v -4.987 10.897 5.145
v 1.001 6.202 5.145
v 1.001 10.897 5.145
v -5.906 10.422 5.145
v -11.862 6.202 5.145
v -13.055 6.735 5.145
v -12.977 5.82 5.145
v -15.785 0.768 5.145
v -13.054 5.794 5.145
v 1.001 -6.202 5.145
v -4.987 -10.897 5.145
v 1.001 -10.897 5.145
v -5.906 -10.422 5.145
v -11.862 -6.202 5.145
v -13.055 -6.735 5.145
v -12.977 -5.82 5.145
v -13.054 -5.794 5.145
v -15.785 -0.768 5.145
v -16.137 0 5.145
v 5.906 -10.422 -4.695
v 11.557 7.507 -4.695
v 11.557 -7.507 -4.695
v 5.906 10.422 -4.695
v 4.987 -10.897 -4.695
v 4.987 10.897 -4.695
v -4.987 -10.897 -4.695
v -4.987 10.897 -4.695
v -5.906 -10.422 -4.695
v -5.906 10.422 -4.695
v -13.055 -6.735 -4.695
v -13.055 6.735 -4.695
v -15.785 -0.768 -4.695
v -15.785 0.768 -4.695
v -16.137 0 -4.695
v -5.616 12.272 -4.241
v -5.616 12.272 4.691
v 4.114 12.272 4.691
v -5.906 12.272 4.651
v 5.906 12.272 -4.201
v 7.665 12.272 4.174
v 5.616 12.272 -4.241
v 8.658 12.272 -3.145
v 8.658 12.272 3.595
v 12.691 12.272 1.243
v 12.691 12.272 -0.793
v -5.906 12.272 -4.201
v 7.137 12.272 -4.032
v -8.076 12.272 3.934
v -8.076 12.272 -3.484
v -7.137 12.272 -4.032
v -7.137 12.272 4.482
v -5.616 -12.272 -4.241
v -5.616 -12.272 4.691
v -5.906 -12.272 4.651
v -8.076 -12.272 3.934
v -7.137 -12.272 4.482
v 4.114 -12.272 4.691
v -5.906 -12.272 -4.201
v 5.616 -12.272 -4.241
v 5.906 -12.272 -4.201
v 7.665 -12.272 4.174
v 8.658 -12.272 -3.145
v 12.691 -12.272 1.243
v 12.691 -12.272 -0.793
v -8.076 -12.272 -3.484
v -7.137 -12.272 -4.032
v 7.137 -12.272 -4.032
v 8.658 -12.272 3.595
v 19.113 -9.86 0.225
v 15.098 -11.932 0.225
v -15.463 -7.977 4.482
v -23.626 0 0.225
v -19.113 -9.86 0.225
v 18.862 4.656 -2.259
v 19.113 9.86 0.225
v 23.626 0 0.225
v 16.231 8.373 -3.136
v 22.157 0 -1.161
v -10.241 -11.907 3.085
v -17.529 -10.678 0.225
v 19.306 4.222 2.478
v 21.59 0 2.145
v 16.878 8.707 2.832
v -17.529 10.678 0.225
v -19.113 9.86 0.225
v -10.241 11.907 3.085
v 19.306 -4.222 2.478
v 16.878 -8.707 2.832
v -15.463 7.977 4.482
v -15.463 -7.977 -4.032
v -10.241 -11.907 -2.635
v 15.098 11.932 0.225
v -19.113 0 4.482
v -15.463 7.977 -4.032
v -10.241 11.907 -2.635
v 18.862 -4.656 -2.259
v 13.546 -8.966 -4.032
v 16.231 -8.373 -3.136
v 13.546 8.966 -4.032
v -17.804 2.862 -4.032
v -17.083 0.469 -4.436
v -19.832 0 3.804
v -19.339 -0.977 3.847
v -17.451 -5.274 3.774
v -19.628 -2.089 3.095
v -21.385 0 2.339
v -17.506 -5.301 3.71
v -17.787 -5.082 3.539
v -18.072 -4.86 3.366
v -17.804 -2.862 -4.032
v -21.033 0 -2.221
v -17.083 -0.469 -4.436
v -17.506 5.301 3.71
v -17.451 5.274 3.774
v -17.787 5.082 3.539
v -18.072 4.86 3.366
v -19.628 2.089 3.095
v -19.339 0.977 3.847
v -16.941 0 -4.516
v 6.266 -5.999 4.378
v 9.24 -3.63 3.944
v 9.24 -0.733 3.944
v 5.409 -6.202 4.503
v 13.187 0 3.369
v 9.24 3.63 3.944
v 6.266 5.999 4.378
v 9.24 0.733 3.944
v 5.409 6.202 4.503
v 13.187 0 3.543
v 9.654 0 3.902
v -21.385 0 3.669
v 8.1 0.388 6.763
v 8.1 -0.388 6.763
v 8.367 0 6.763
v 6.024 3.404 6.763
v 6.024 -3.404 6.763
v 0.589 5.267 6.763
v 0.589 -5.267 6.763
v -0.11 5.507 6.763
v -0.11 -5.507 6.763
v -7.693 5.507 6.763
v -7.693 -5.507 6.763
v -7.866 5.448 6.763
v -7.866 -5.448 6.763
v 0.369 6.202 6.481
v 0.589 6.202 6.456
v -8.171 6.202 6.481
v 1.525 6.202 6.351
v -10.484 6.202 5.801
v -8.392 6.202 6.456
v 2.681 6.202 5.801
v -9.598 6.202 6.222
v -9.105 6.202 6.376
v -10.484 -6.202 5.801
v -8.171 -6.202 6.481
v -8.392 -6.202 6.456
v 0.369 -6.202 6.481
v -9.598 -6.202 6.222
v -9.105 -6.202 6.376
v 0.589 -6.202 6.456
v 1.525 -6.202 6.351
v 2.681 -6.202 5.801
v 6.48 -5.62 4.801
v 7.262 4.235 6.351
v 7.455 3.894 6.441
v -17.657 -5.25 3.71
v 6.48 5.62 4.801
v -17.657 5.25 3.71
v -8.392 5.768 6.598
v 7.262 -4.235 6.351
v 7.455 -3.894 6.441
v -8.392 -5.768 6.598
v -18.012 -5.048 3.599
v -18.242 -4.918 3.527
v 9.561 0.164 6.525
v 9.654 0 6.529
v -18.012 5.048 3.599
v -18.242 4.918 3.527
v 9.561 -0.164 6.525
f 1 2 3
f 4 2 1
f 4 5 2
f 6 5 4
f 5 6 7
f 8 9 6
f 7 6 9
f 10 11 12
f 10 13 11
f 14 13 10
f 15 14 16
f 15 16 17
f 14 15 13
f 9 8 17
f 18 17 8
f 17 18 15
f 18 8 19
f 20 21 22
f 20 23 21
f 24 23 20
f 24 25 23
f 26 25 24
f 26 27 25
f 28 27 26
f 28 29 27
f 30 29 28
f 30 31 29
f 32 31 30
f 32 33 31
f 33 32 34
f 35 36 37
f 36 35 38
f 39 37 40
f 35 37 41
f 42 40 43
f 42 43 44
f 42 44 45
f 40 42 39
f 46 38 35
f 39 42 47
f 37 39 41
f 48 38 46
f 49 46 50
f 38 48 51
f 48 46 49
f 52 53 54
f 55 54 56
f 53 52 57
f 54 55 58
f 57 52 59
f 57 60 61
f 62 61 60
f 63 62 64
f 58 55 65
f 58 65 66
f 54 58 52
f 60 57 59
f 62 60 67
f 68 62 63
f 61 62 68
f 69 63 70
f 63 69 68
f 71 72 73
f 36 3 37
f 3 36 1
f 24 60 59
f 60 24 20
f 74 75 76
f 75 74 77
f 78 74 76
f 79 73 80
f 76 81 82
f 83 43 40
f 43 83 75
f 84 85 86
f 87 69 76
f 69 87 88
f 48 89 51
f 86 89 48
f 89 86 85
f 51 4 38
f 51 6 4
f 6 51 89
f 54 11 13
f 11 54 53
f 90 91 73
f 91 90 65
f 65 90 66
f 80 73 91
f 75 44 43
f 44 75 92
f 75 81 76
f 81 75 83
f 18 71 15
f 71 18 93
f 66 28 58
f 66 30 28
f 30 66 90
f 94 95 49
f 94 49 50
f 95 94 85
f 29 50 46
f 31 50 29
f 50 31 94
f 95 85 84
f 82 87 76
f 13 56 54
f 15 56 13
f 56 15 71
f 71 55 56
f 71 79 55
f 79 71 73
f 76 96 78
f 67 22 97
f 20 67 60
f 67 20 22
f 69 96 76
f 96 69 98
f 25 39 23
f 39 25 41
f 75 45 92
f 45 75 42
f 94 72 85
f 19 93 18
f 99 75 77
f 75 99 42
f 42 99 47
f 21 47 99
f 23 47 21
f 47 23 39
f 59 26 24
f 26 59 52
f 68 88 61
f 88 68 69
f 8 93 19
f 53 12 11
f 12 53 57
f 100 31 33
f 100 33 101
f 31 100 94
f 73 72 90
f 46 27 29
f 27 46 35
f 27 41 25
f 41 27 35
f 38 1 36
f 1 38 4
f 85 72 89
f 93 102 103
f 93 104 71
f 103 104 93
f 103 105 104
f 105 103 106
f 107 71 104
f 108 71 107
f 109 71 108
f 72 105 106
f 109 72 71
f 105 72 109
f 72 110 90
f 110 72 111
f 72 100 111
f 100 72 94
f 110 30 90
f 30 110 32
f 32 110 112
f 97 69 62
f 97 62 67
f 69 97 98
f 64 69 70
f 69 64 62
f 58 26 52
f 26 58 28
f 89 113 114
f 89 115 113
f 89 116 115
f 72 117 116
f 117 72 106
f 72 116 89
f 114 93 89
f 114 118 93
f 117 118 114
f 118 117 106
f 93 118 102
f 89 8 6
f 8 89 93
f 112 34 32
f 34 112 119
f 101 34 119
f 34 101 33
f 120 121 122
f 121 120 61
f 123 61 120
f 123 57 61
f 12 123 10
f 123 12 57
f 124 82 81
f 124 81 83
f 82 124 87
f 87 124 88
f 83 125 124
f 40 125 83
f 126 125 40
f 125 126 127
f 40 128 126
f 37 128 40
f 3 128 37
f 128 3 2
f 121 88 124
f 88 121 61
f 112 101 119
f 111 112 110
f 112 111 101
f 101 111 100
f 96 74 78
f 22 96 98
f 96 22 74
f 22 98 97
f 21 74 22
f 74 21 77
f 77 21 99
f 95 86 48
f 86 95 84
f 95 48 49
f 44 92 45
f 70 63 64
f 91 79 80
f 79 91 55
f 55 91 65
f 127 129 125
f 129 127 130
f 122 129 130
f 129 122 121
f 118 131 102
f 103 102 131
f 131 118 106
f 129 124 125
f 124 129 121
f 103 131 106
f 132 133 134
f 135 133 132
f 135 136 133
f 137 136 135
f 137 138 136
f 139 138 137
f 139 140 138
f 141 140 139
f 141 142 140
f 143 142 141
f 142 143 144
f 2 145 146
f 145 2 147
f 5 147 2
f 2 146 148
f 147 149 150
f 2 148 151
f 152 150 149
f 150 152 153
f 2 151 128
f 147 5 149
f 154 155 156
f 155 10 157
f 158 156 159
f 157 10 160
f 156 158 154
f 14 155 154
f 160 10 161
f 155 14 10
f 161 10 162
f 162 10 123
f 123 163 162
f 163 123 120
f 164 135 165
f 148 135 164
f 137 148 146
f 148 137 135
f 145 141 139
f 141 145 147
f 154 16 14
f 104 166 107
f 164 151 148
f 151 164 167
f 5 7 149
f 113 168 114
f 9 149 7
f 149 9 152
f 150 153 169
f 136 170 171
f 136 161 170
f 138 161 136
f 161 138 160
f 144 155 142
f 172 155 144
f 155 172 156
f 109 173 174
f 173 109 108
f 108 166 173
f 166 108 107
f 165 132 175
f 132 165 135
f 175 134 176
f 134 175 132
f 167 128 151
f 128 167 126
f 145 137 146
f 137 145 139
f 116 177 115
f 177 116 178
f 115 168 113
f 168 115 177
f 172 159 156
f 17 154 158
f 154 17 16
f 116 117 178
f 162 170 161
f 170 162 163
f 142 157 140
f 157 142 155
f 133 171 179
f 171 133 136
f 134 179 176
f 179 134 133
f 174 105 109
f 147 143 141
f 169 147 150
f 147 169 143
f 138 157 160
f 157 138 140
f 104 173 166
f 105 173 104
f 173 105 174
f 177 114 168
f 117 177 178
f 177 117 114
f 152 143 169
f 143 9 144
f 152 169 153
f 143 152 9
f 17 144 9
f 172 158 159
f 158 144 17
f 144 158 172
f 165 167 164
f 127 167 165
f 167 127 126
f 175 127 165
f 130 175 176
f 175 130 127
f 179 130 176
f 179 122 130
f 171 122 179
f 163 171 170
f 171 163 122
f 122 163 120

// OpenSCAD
////////////////////
//Tank generator by Torleif Ceder 2015 Creative Commons - Attribution - Share Alike

////////////////////

Generate_Random=0.15;//[0:0.0001:1]
size=1;//[0.5;2]
part=1;//[1,2,3,4]

style=floor(rnd(1,6.99));
bubble=rnd(0,2);
//GUN!
gunl=rnd(30,45);//[20:60]
gund=rnd(2,3.5);//[1:10]
gunelev=rnd(-5,25);//[-10:60]
guns=floor(rnd(1,3.99));
gunstyle1=rnd(0,2);
gunstyle2=rnd(0,2);
gunstyle3=rnd(0,2);
//Tracks
skirtstyle1=rnd(0,2);
skirtstyle2=rnd(0,2);
skirtstyle3=floor(rnd(0,1.999));
skirtstyle4=rnd(1,2);
  wi= rnd(1,7);
  bi=rnd(14,16);
  skirtstylero=rnd(-20,15);
theight=rnd(0.8,0.9);//[0:2];
tlengdth=rnd(0.9,1);//[0.8:1.1];
twidth=rnd(0.5,1.2);//[0:3];
tslopeupper=rnd(0.95,1.15);//[0:03];
tslope1=rnd(0.65,0.75);//[0.5;1];
tslope2=rnd(0.1,0.15);//[0:0.5];

B1Xsize=rnd(40,50);//[10:200]
B1Ysize=rnd(B1Xsize*0.5,B1Xsize*.55);//[10:100]
B1Zsize=rnd(B1Ysize*0.4,B1Ysize*.45);//[10:50]
B1Xplace=rnd(0,B1Xsize*0.0);//[-3:0.1:3]
B1Yplace=rnd(0,0);//[-3:0.1:3]
B1Zplace=rnd(0,0.3);//[-3:0.1:3]
TRsc=26/B1Xsize;


B1r1=rnd(30,45);//[0:90]//Front panel: slope&offset
B1o1=rnd(0.1,0.2);//[-1:0.1:1]
B1r2=rnd(55,60);//[0:90]//Rear panel: slope&offset
B1o2=rnd(0.4,0.5);//[-1:0.1:1]
B1r3=rnd(60,75);//[0:90]//Bottom Rear panel: slope&offset
B1o3=rnd(0.3,0.45);//[-1:0.1:1]
B1r4=rnd(45,65);//[0:90]//Bottom Front panel: slope&offset
B1o4=rnd(0.2,0.4);//[-1:0.1:1]
B1r5=rnd(0,40);//[0:90]//left Side Rear panel: slope&offset
B1o5=rnd(0.3,0.5);//[-1:0.1:1]
B1r6=rnd(10,45);//[0:90] //Left Side Front panel: slope&offset
B1o6=rnd(0.4,0.5);//[-1:0.1:1]
B1r7=B1r6;//[0:90]//Right Side Front panel: slope&offset
B1o7=B1o6;//[-1:0.1:1]
B1r8=B1r5;//[0:90] //Right Side Rear panel: slope&offset
B1o8=B1o5;//[-1:0.1:1]
//And so on

B2Xsize=rnd(B1Xsize*0.6,B1Xsize*0.8);//[10:100]
B2Ysize=rnd(B2Xsize*0.2,B2Xsize*0.5);//[10:50]
B2Zsize=rnd(B2Ysize*0.3,B2Ysize*.3);//[10:50]
B2Xplace=B1Xplace+ rnd(-B1Xsize*0.1,B1Xsize*0.1);//[-30:0.1:30]
B2Yplace=B1Yplace;//[-30:0.1:30]
B2Zplace=B1Zplace+rnd(B1Zsize*0.3,B1Zsize*0.3);//[-30:0.1:30]

B2r1=rnd(40,80);//[0:90]//Front panel: slope&offset
B2o1=rnd(0,0.3);//[-1:0.1:1]
B2r2=rnd(0,80);//[0:90]//Rear panel: slope&offset
B2o2=rnd(0,0.5);//[-1:0.1:1]
B2r3=rnd(0,40);//[0:90]//Bottom Rear panel: slope&offset
B2o3=rnd(00.4,0.5);//[-1:0.1:1]
B2r4=rnd(0,80);//[0:90]//Bottom Front panel: slope&offset
B2o4=rnd(0,0.5);//[-1:0.1:1]
B2r5=rnd(30,80);//[0:90]//left Side Rear panel: slope&offset
B2o5=rnd(0,0.4);//[-1:0.1:1]
B2r6=rnd(30,80);//[0:90] //Left Side Front panel: slope&offset
B2o6=rnd(0,0.4);//[-1:0.1:1]
B2r7=B2r6;//[0:90]//Right Side Front panel: slope&offset
B2o7=B2o6;//[-1:0.1:1]
B2r8=B2r5;//[0:90]//Right Side Rear panel: slope&offset
B2o8=B2o5;//[-1:0.1:1]


B3Xsize=rnd(B2Xsize*0.7,B2Xsize*0.9);//[10:100]
B3Ysize=rnd(B3Xsize*0.2,B3Xsize*0.7);//[10:50]
B3Zsize=rnd(B3Ysize*0.4,B3Ysize*0.5);//[10:50]
B3Xplace=-B1Xplace- rnd(0,B1Xsize*0.1);//[-3:0.1:3]
B3Yplace=B1Yplace;//[-3:0.1:3]
B3Zplace=B1Zplace+rnd(B1Zsize*0.3,B1Zsize*0.3+B2Zsize*0.3);//[-3:0.1:3]

B3r1=rnd(0,80);//[0:90]//Front panel: slope&offset
B3o1=rnd(0,0.5);//[-1:0.1:1]
B3r2=rnd(0,80);//[0:90]//Rear panel: slope&offset
B3o2=rnd(0,0.5);//[-1:0.1:1]
B3r3=rnd(0,80);//[0:90]//Bottom Rear panel: slope&offset
B3o3=rnd(0,0.5);//[-1:0.1:1]
B3r4=rnd(0,80);//[0:90]//Bottom Front panel: slope&offset
B3o4=rnd(0,0.5);//[-1:0.1:1]
B3r5=rnd(0,80);//[0:90]//left Side Rear panel: slope&offset
B3o5=rnd(0,0.5);//[-1:0.1:1]
B3r6=rnd(0,80);//[0:90] //Left Side Front panel: slope&offset
B3o6=rnd(0,0.5);//[-1:0.1:1]
B3r7=B3r6;//[0:90]//Right Side Front panel: slope&offset
B3o7=B3o6;//[-1:0.1:1]
B3r8=B3r5;//[0:90]//Right Side Rear panel: slope&offset
B3o8=B3o5;//[-1:0.1:1]



Rotate=rnd(-40,40);//[-360:360]

T1Xsize=B1Xsize*rnd(0.6,0.7);//[10:200]
T1Ysize=B1Ysize*rnd(0.8,0.9);//[10:100]
T1Zsize=B1Zsize*rnd(0.4,0.6);//[10:50]

T1Xplace=B3Xplace- rnd(-B1Xsize*0.2,B1Xsize*0.2);//[-3:0.1:3]
T1Yplace=B3Yplace;//[-3:0.1:3]
T1Zplace=B3Zplace+B3Zsize*0.5+T1Zsize*0.5;//[-3:0.1:3]
// Turret Front panel: slope&offset
T1r1=rnd(40,50);//  [0:90]
T1o1=rnd(0,0.2);//  [-1:0.1:1]
// Turret Rear panel: slope&offset
T1r2=rnd(30,40);//  [0:90]
T1o2=rnd(0.3,0.5);//  [-1:0.1:1]
// Turret Bottom Rear panel: slope&offset
T1r3=rnd(0,10);//  [0:90]
T1o3=rnd(0,0.5);//  [-1:0.1:1]
 // Turret Bottom Front panel: slope&offset
T1r4=rnd(40,60);//  [0:90]
T1o4=rnd(0.3,0.5);//  [-1:0.1:1]
 // Turret left Side Rear panel: slope&offset
T1r5=rnd(0,40);//  [0:90]
T1o5=rnd(0,0.2);//  [-1:0.1:1]
 // Turret Left Side Front panel: slope&offset
T1r6=rnd(0,40);//  [0:90]
T1o6=rnd(0,0.4);//  [-1:0.1:1]
 // Turret Right Side Front panel: slope&offset
T1r7=T1r6;//  [0:90]
T1o7=T1o6;//  [-1:0.1:1]
 // Turret Right Side Rear panel: slope&offset
T1r8=T1r5;//  [0:90]
T1o8=T1o5;//  [-1:0.1:1]
// Turret And so on


T2Xsize=rnd(T1Xsize*rnd(0.4,0.6),T1Xsize*0.75);//  [10:100]
T2Ysize=rnd(T2Xsize*rnd(0.4,0.6),T2Xsize*0.9);//  [10:50]
T2Zsize=rnd(T1Zsize*rnd(0.4,0.6),T1Zsize*0.9);//  [10:50]
T2Xplace=T1Xplace +rnd(-T1Xsize*0.1,T1Xsize*0.1);//  [-30:0.1:30]
T2Yplace=T1Yplace;//  [-30:0.1:30]
T2Zplace=T1Zplace+rnd(T1Zsize*0.4,T1Zsize*0.4+T2Zsize*0.2);//  [-30:0.1:30]

T2r1=rnd(0,80);//  [0:90]// Turret Front panel: slope&offset
T2o1=rnd(0,0.5);//  [-1:0.1:1]
T2r2=rnd(0,80);//  [0:90]// Turret Rear panel: slope&offset
T2o2=rnd(0,0.5);//  [-1:0.1:1]
T2r3=rnd(0,30);//  [0:90]// Turret Bottom Rear panel: slope&offset
T2o3=rnd(0.4,0.6);//  [-1:0.1:1]
T2r4=rnd(60,80);//  [0:90]// Turret Bottom Front panel: slope&offset
T2o4=rnd(0.3,0.5);//  [-1:0.1:1]
T2r5=rnd(0,80);//  [0:90]// Turret left Side Rear panel: slope&offset
T2o5=rnd(0,0.5);//  [-1:0.1:1]
T2r6=rnd(0,80);//  [0:90] // Turret Left Side Front panel: slope&offset
T2o6=rnd(0,0.5);//  [-1:0.1:1]
T2r7=T2r6;//  [0:90]// Turret Right Side Front panel: slope&offset
T2o7=T2o6;//  [-1:0.1:1]
T2r8=T2r5;//  [0:90]// Turret Right Side Rear panel: slope&offset
T2o8=T2o5;//  [-1:0.1:1]


T3Xsize=rnd(T2Xsize*0.8,T2Xsize*0.9);//  [10:100]
T3Ysize=rnd(T3Xsize*0.7,T3Xsize*0.9);//  [10:50]
T3Zsize=rnd(gund*1.5,gund*1.5);//  [10:50]
T3Xplace=T2Xplace+rnd(-T1Xsize*0.1,T1Xsize*0.1);//  [-3:0.1:3]
T3Yplace=T2Yplace;//  [-3:0.1:3]
T3Zplace=T2Zplace+rnd(T2Zsize*0.3,T2Zsize*0.2-T3Zsize*0.2);//  [-3:0.1:3]

T3r1=rnd(30,80);//  [0:90]// Turret Front panel: slope&offset
T3o1=rnd(0,0.3);//  [-1:0.1:1]
T3r2=rnd(0,80);//  [0:90]// Turret Rear panel: slope&offset
T3o2=rnd(0,0.5);//  [-1:0.1:1]
T3r3=rnd(0,30);//  [0:90]// Turret Bottom Rear panel: slope&offset
T3o3=rnd(0.4,0.5);//  [-1:0.1:1]
T3r4=rnd(0,80);//  [0:90]// Turret Bottom Front panel: slope&offset
T3o4=rnd(0,0.5);//  [-1:0.1:1]
T3r5=rnd(0,80);//  [0:90]// Turret left Side Rear panel: slope&offset
T3o5=rnd(0,0.5);//  [-1:0.1:1]
T3r6=rnd(0,80);//  [0:90] // Turret Left Side Front panel: slope&offset
T3o6=rnd(0,0.5);//  [-1:0.1:1]
T3r7=T3r6;//  [0:90]// Turret Right Side Front panel: slope&offset
T3o7=T3o6;//  [-1:0.1:1]
T3r8=T3r5;//  [0:90]// Turret Right Side Rear panel: slope&offset
T3o8=T3o5;//  [-1:0.1:1]

////////////////////////////////////////



/////////////////Main/////////////////////

scale(size) union(){
color("Olive") translate([-B1Xsize/2,-B1Ysize/2,-B1Zsize/1.3])//resize([B1Xsize, B1Ysize/3*twidth, B1Zsize*theight])
    scale(TRsc)scale([1.1,twidth,1.1])track();
color("Olive") translate([-B1Xsize/2,B1Ysize/2,-B1Zsize/1.3])mirror([0,1,0])
    //resize([B1Xsize, B1Ysize/3*twidth, B1Zsize*theight])
    scale(TRsc)scale([1.1,twidth,1.1])track();


!rotate([0,0,0]){
color("Red")translate([B1Xplace, B1Yplace, B1Zplace])resize([B1Xsize, B1Ysize, B1Zsize])	
body(B1r1, B1o1, B1r2, B1o2, B1r3, B1o3, B1r4, B1o4, B1r5, B1o5, B1r6, B1o6, B1r7, B1o7, B1r8, B1o8);

color("Green")translate([B2Xplace, B2Yplace,B2Zplace])resize([B2Xsize, B2Ysize, B2Zsize])
body(B2r1, B2o1, B2r2, B2o2, B2r3, B2o3, B2r4, B2o4, B2r5, B2o5, B2r6, B2o6, B2r7, B2o7, B2r8, B2o8);

color("Blue")translate([B3Xplace,B3Yplace,B3Zplace])resize([B3Xsize, B3Ysize, B3Zsize])
body(B3r1, B3o1, B3r2, B3o2, B3r3, B3o3, B3r4, B3o4, B3r5, B3o5, B3r6, B3o6, B3r7, B3o7, B3r8, B3o8);
   
}

translate([T1Xplace,0,0])rotate([0,0,0]){   

 color("DarkOliveGreen") translate([0,T1Yplace,B3Zplace-B2Zsize])  cylinder(d=max(B2Ysize,B3Ysize),h=B2Zsize*2.5);
color("Olive")translate([0, T1Yplace, T1Zplace])resize([T1Xsize, T1Ysize, T1Zsize])	
body(T1r1, T1o1, T1r2, T1o2, T1r3, T1o3, T1r4, T1o4, T1r5, T1o5, T1r6, T1o6, T1r7, T1o7, T1r8, T1o8);

color("Olive")translate([T2Xplace-T1Xplace, T2Yplace,T2Zplace])resize([T2Xsize, T2Ysize, T2Zsize])
body(T2r1, T2o1, T2r2, T2o2, T2r3, T2o3, T2r4, T2o4, T2r5, T2o5, T2r6, T2o6, T2r7, T2o7, T2r8, T2o8);

color("Olive")translate([T3Xplace-T1Xplace,T3Yplace,T3Zplace])resize([T3Xsize, T3Ysize, T3Zsize])
body(T3r1, T3o1, T3r2, T3o2, T3r3, T3o3, T3r4, T3o4, T3r5, T3o5, T3r6, T3o6, T3r7, T3o7, T3r8, T3o8);
   
    
  translate([0,T2Yplace,T3Zplace]) rotate ([0,-gunelev,0]){
    if(guns==1){
    gun(gunl,gund);
    }
    if(guns==2){
    translate([0,gund,0])gun(gunl,gund);    
    translate([0,-gund,0])gun(gunl,gund);
    }
    if(guns==3){
    translate([0,gund*1.5,0])gun(gunl,gund);    
    translate([0,0,0])gun(gunl,gund);    
    translate([0,-gund*1.5,0])gun(gunl,gund);    
    }}
   
    }
}

//////////////////////MODULES/////////////////

module body(r1,o1,r2,o2,r3,o3,r4,o4,r5,o5,r6,o6,r7,o7,r8,o8){
fudge=0.0001;
difference(){ 
   if (bubble>1){
       
       if (bubble>2){
       translate([0,0,0]) 
       intersection(){
           cube([1,1,1],center=true);
          hull(){ 
         translate([0,-0.2,0])resize([1,1,1.4])sphere(10,center=true,$fn=12);
         translate([0,0.2,0])resize([1,1,1.4])sphere(10,center=true,$fn=12);}}
       
   }
       else{
       translate([0,0,0]) 
       intersection(){
           cube([1,1,1],center=true);
       resize([1,1.3,1.4])sphere(10,center=true,$fn=10);}}
       
       
   }else{translate([0,0,0]) resize([1,1,1])tcube();}

//Front_slope
color("LightGreen",0.5)
    translate([o1,0,0.5])rotate ([0,r1,0])translate([0,0,0.5])tcube();
//back_slope
color("Green",0.5) 
    translate([-o2,0,0.5])rotate ([0,-r2,0])translate([0,0,0.5])tcube();
//Front_under_slope
color("DarkGreen",0.5)
    translate([-o3,0,-0.5])rotate ([0,r3,0])translate([0,0,-0.5])tcube();
//back_under_slope
color("DarkGreen",0.5) 
    translate([o4,0,-0.5])rotate ([0,-r4,0])translate([0,0,-0.5])tcube();

//Front_right_slope
color("Pink",0.5)
    translate([-o5,0.5,0])rotate ([0,0,r5])translate([0,0.5,0])tcube();
//back_right_slope
color("Pink",0.5) 
    translate([o6,0.5,0])rotate ([0,0,-r6])translate([0,0.5,0])tcube();
//Front_left_slope
color("Red",0.5) 
    translate([o7,-0.5,0])rotate([0,0,r7])translate([0,-0.5,0])tcube();
//back_left_slope
color("red",0.5)
    translate([-o8,-0.5,0])rotate([0,0,-r8])translate([0,-0.5,0])tcube();
    
}  }









//////////////////////////////////
function rnd(n,m)=rands(n,m,9)[part];

module gun(l,d){
   color("Olive") rotate ([0,90,0]){
       translate([0,0,3])resize([d*1.2,d*1.4
      ,d*3])cube(1,center=true);
      
        difference() {   
            
            
            
           union(){ 
               if (gunstyle1>1){for(i=[0:6]){    translate([0,0,d*2.9 + i])cylinder(d=d*1.55,l*0.01,$fn=8);     }}
            
            if (gunstyle2>1){for(i=[0:3]){    rotate([0,0,i*60])translate([0,0,l*0.5])cube([d*1.15,d*0.25,l],center=true);     }}
            if (gunstyle3>1){for(i=[0:2:5]){    translate([0,0,l*1.01- i*1.7])cylinder(d=d*1.55,l*0.08,$fn=8);     }}
            
               translate([0,0,0])cylinder(d=d,l,$fn=20);}
        cylinder(d=d*0.7,l*1.3+1.001,$fn=20);
            }
        difference(){
        translate([0,0,gunl])cylinder(d=d*1.25,l*0.1,$fn=20);
        translate([0,0,gunl*0.9+0.001])cylinder(d=d*.7,l*0.2,$fn=20);
        }
    }
    
    }


module track(){
xlist=[
[0, 60*tslope1*tlengdth],
[1, 60*tslope2*tlengdth],
[2, 0],
[3, 30*tlengdth],
[4, 60*tlengdth], 
[5, 60*tslope1*tlengdth],
[6, 60*tslope2*tlengdth],// allway the same as nr1
[7,0]// allway the same as nr2
];

ylist=[
[1, 0],
[2, 10*theight],
[3, 8*theight],
[4, 12*tslopeupper*theight], 
[5, 0],
[6, 0],// allway the same as nr1
[7,10*theight]// allway the same as nr2
];
function x(p)= lookup(p, xlist);
function y(p)= lookup(p, ylist);

color("DarkGray")translate([0,-8,0])rotate([90,0,0])
{

//skirt
    
color("DarkOliveGreen") intersection(){
     hull(){
     for (i=[2:1:4]) {
 
    color("Red")
    translate([x(i), y(i),0]) 
    translate([0,4,0])resize([18,8,18])cube(1,center=true);
    }}
    
    difference(){
       union(){
     if(skirtstyle1>1){  
      
         
         for (i=[2.1:0.3:4.0]) { translate([x(i), y(i),0]) 
    translate([0,0,0])rotate([0,0,skirtstylero])cube ([wi,35,bi],center=true);}}
           
    hull(){for (i=[2:1:4]){color("Red")
    translate([x(i), y(i),0]) 
    translate([0,0,-8])cylinder(r=7,h=16,$fn=8);}}
    if(skirtstyle2>1){  
    hull(){for (i=[2:1:4]){color("Red")
    translate([x(i), y(i),0]) 
    translate([0,0,-7])cylinder(r=8,h=1,$fn=8);}}
     hull(){for (i=[2:1:4]){color("Red")
    translate([x(i), y(i),0]) 
    translate([0,0,-2.5])cylinder(r=8,h=1,$fn=8);}}
     hull(){for (i=[2:1:4]){color("Red")
    translate([x(i), y(i),0]) 
    translate([0,0,2])cylinder(r=8,h=1,$fn=8);}}
    
    if(skirtstyle4>1){  
      
         
         for (i=[2.1:0.3:4.0]) { translate([x(i), y(i),0]) 
    translate([0,0,8])rotate([0,0,skirtstylero]) translate([0,15,0])cube ([wi,25,4],center=true);}}
}
    }
          
   
    hull(){
     for (i=[2:1:4]) {
 
    color("Red")
    translate([x(i), y(i),0]) 
    translate([0,0,-4-skirtstyle3*3])cylinder(r=6,h=12.1,$fn=8);
    }}
    
    }
}

// wheels

wsp=1;// wheel spacing
//large wheels
 for (i = [1:wsp:6]) {
 ah=0.42;
 	    ro=atan2(y(i+ah)-y(i-ah),x(i+ah)-x(i-ah));

    color("Gray")
    translate([x(i), y(i),0]) 
    rotate([0,0,ro])translate([0,0,2])resize([9,9,3])wheel();
    }
    
 //small wheels
   
     for (i = [1+wsp*0.43:wsp/4:6]) {
 ah=0.42;
    ro=atan2(y(i+ah)-y(i-ah),x(i+ah)-x(i-ah));
    color("Gray")
    translate([x(i), y(i),0]) 
    rotate([0,0,ro+10])translate([0,1.5,-1])resize([6,6,3])wheel();
    }

//filler
hull(){
     for (i=[1:1:6]) {
 
    color("Blue")
    translate([x(i), y(i),0]) 
    translate([0,0,-7.501])cylinder(r=4.5,h=6.2,$fn=8);
    }}

//trackmagic
intersection(){
    union(){
for (i = [1:0.25:6]) {
 ah=0.42;
 	
    ro=atan2(y(i+ah)-y(i-ah),x(i+ah)-x(i-ah));

 	//translate([(x(i-0.2)+x(i+0.2))/2, (y(i-0.2)+y(i+0.2))/2,0])
    translate([x(i), y(i),0]) 
    rotate([0,0,ro])
    translate([0,5,0])
    rotate([0,0,-ro])
    cylinder(r=8,15.001,center=true,$fn=6);
}
}
difference(){
union(){
 for (i = [1:0.1:6]) {
 ah=0.42;
 	 	    ro=atan2(y(i+ah)-y(i-ah),x(i+ah)-x(i-ah));

    color("Red")
    translate([x(i), y(i),0]) 
    rotate([0,0,ro])translate([0,0,0])cylinder(r=5,h=15,center=true,$fn=14);
     
    }
}
union(){
 for (i = [1:0.1:6]) {
 ah=0.42;
 	 	    ro=atan2(y(i+ah)-y(i-ah),x(i+ah)-x(i-ah));

    color("Blue")
    translate([x(i), y(i),0]) 
    rotate([0,0,ro])translate([0,0,0])cylinder(r=4,h=16,center=true,$fn=12);
    }
}
}

}

}
}    
    module wheel(){
        translate([0,0,-2])
        difference(){
        cylinder(r=4,h=3);    
        translate([0,0,2])cylinder(r=3,h=2);
        }
        cylinder(r=1,h=1);
        
        }
        
        /////// T Cube //////////
        module tcube(){resize([2,1.1,1.1])
            if(part<3){cube(1,center=true);}
            else{
            intersection(){intersection(){
                
                intersection(){
                color("Blue" ,0.5)
                    rotate ([0,0,0])
                translate([rnd(-3,3),0,-0.05]) resize([8.01,1.5,1])strip();
             color("Blue",0.5)
                    rotate ([90,0,0])
                translate([rnd(-3,3),0,-0.05]) resize([8.01,1.5,1])strip();
            }
            intersection(){
                color("Red",0.5)rotate ([180,0,0])
                translate([rnd(-3,3),0,-0.05]) resize([8.01,1.5,1])strip();
                color("Red",0.5)rotate ([270,0,0])
                translate([rnd(-3,3),0,-0.05]) resize([8.01,1.5,1])strip();
            }
            }
            union(){
               color("Green",0.5)rotate ([0,90,0])
                translate([rnd(-3,3),0,0.45]) resize([8.01,1.5,1])strip();
                color("Green",0.5)rotate ([0,270,0])
                translate([rnd(-3,3),0,0.45]) resize([8.01,1.5,1])strip();}
                
            }}}
            
         module strip(scale) {
if (style==1){ difference(){
    cube([8,2,1],center=true);
for(i=[0:0.2:0.9])
    {
   translate([-3.9+i,0,1-0.0251]) cube([0.1,0.99,1.01],center=true);
   translate([2.3,0.40-i,1-0.0251]) cube([0.99,0.1,1.01],center=true);
     
    }
 for(i=[0:0.25:0.9])
    {
   translate([0.8+i,0,1-0.0251]) cube([0.2,0.9,1.01],center=true);
   translate([-2.65,0.40-i,1-0.0251]) cube([0.449,0.2,1.01],center=true);
     translate([-2.15,0.40-i,1-0.0251]) cube([0.449,0.2,1.01],center=true);
    }
    
    translate([3.4,0,0.5-0.05] ) cylinder(d=0.7,d2=0.9,h=0.06,$fn=18);
    
    translate([0,0,0.48])difference(){
         cylinder(d=0.999,h=0.054,$fn=18);
        cylinder(d=0.8,h=0.01,$fn=18);

        }
            translate([-1,0.25,0.48])difference(){
        cylinder(d2=0.5,d=0.4,h=0.054,$fn=10);
        cylinder(d2=0.2,d=0.3,h=0.01,$fn=10);

        }
             translate([-1,-0.25,0.48])difference(){
        cylinder(d2=0.5,d=0.4,h=0.054,$fn=10);
        cylinder(d2=0.2,d=0.3,h=0.01,$fn=10);

        }
        
              translate([-1.5,0.25,0.48])difference(){
        cylinder(d2=0.5,d=0.4,h=0.054,$fn=10);
        cylinder(d2=0.2,d=0.3,h=0.01,$fn=10);

        }
             translate([-1.5,-0.25,0.48])difference(){
        cylinder(d2=0.5,d=0.4,h=0.054,$fn=10);
        cylinder(d2=0.2,d=0.3,h=0.01,$fn=10);

        }
        
    }}
if (style==2){ union(){
    cube([8,2,1],center=true);
for(i=[0:0.2:0.9])
    {
   translate([-3.9+i,0,0.51]) cube([0.1,0.99,0.05],center=true);
   translate([2.3,0.40-i,0.51]) cube([0.99,0.1,0.05],center=true);
     
    }
 for(i=[0:0.25:0.9])
    {
   translate([0.8+i,0,0.51]) cube([0.2,0.9,0.051],center=true);
   translate([-2.65,0.40-i,0.51]) cube([0.449,0.2,0.05],center=true);
     translate([-2.15,0.40-i,0.51]) cube([0.449,0.2,0.05],center=true);
    }
    
    translate([3.4,0,0.4999] ) cylinder(d=0.9,d2=0.7,h=0.06,$fn=18);
    
    translate([0,0,0.4999])difference(){
         cylinder(d2=0.95,d=1,h=0.054,$fn=18);
        cylinder(d2=0.8,d=0.75,h=0.055,$fn=18);

        }
            translate([-1,0.25,0.48])difference(){
        cylinder(d2=0.4,d=0.5,h=0.054,$fn=10);
        cylinder(d2=0.3,d=0.2,h=0.01,$fn=10);

        }
             translate([-1,-0.25,0.48])difference(){
        cylinder(d2=0.4,d=0.5,h=0.054,$fn=10);
        cylinder(d2=0.3,d=0.2,h=0.01,$fn=10);

        }
        
              translate([-1.5,0.25,0.48])difference(){
        cylinder(d2=0.4,d=0.5,h=0.054,$fn=10);
        cylinder(d2=0.3,d=0.2,h=0.01,$fn=10);

        }
             translate([-1.5,-0.25,0.48])difference(){
        cylinder(d2=0.4,d=0.5,h=0.054,$fn=10);
        cylinder(d2=0.3,d=0.2,h=0.01,$fn=10);

        }
        
    }}
     
    if (style==3){ union(){
    cube([8,2,1],center=true);
for(i=[0:0.2:0.9])
    {
   translate([-3.9+i,0,0.51]) cube([0.1,0.99,0.1],center=true);
   translate([2.3,0.40-i,0.51]) cube([0.99,0.1,0.1],center=true);
     
    }
 for(i=[0:0.25:0.9])
    {
   translate([0.8+i,0,0.51]) cube([0.2,0.9,0.1],center=true);
   translate([-2.65,0.40-i,0.51]) cube([0.449,0.2,0.1],center=true);
     translate([-2.15,0.40-i,0.51]) cube([0.449,0.2,0.1],center=true);
    }
    
    translate([3.4,0,0.4999] ) cylinder(d=0.9,d2=0.7,h=0.06,$fn=18);
    
    translate([0,0,0.4999])difference(){
         cylinder(d2=0.95,d=1,h=0.054,$fn=18);
        cylinder(d2=0.8,d=0.75,h=0.055,$fn=18);

        }
            translate([-1,0.25,0.48])difference(){
        cylinder(d2=0.4,d=0.5,h=0.054,$fn=10);
        cylinder(d2=0.3,d=0.2,h=0.01,$fn=10);

        }
             translate([-1,-0.25,0.48])difference(){
        cylinder(d2=0.4,d=0.5,h=0.054,$fn=10);
        cylinder(d2=0.3,d=0.2,h=0.01,$fn=10);

        }
        
              translate([-1.5,0.25,0.48])difference(){
        cylinder(d2=0.4,d=0.5,h=0.054,$fn=10);
        cylinder(d2=0.3,d=0.2,h=0.01,$fn=10);

        }
             translate([-1.5,-0.25,0.48])difference(){
        cylinder(d2=0.4,d=0.5,h=0.054,$fn=10);
        cylinder(d2=0.3,d=0.2,h=0.01,$fn=10);

        }
        
    }}
    if (style==4){ union(){
    cube([8,2,1],center=true);
for(i=[0:0.2:0.9])
    {
   translate([-3.9+i,0,0.5])rotate([0,45,0]) cube([0.1,0.99,0.1],center=true);
   translate([2.3,0.40-i,0.5]) rotate([45,0,0]) cube([0.99,0.1,0.1],center=true);
     
    }
 for(i=[0:0.25:0.9])
    {
   translate([0.8+i,0,0.51]) cube([0.2,0.9,0.1],center=true);
   translate([-2.65,0.40-i,0.51]) cube([0.449,0.2,0.1],center=true);
     translate([-2.15,0.40-i,0.51]) cube([0.449,0.2,0.1],center=true);
    }
    
    translate([3.4,0,0.4999] ) cylinder(d=0.9,d2=0.7,h=0.06,$fn=4);
    
    translate([0,0,0.4999])scale([1,0.8,1])difference(){
         cylinder(d2=0.95,d=1,h=0.054,$fn=6);
        cylinder(d2=0.6,d=0.55,h=0.055,$fn=6);

        }
            translate([-1,0.25,0.48])scale([1,0.5,1])difference(){
        cylinder(d2=0.4,d=0.5,h=0.054,$fn=4);
        cylinder(d2=0.3,d=0.2,h=0.016,$fn=4);

        }
             translate([-1,-0.25,0.48])scale([1,0.5,1])difference(){
        cylinder(d2=0.4,d=0.5,h=0.054,$fn=4);
        cylinder(d2=0.3,d=0.2,h=0.016,$fn=4);

        }
        
              translate([-1.5,0.25,0.48])scale([1,0.5,1])difference(){
        cylinder(d2=0.4,d=0.5,h=0.054,$fn=4);
        cylinder(d2=0.3,d=0.2,h=0.016,$fn=4);

        }
             translate([-1.5,-0.25,0.48])scale([1,0.5,1])difference(){
        cylinder(d2=0.4,d=0.5,h=0.054,$fn=4);
        cylinder(d2=0.3,d=0.2,h=0.01,$fn=4);
        }
        
        
 translate([-1,0,0.48])scale([1,0.5,1])difference(){
        cylinder(d2=0.4,d=0.5,h=0.054,$fn=4);
        cylinder(d2=0.3,d=0.2,h=0.016,$fn=4);

        }
             translate([-1.5,0,0.48])scale([1,0.5,1])difference(){
        cylinder(d2=0.4,d=0.5,h=0.054,$fn=4);
        cylinder(d2=0.3,d=0.2,h=0.01,$fn=4);
        }
        
    }}
    
     if (style==5){ union(){
    cube([8,2,1],center=true);
for(i=[0:0.2:0.9])
    {
   translate([-3.9+i,0,0.5])rotate([0,45,0]) cube([0.1,0.99,0.1],center=true);
   translate([2.3,0.40-i,0.5]) rotate([45,0,0]) cube([0.99,0.1,0.1],center=true);
     
    }
 for(i=[0:0.25:0.9])
    {
   translate([0.8+i,0,0.51]) cube([0.2,0.9,0.1],center=true);
   translate([-2.65,0.40-i,0.51]) cube([0.449,0.2,0.1],center=true);
     translate([-2.15,0.40-i,0.51]) cube([0.449,0.2,0.1],center=true);
    }
    
    translate([3.4,0,0.4999] ) cylinder(d=0.9,d2=0.7,h=0.06,$fn=5);
    
    translate([0,0,0.4999])scale([1,1,1])difference(){
         cylinder(d2=0.95,d=1,h=0.054,$fn=5);
        cylinder(d2=0.6,d=0.55,h=0.055,$fn=5);

        }
            translate([-1,0.25,0.48])scale([1,1,1])difference(){
        cylinder(d2=0.4,d=0.5,h=0.054,$fn=5);
        cylinder(d2=0.3,d=0.2,h=0.016,$fn=5);

        }
             translate([-1,-0.25,0.48])scale([1,1,1])difference(){
        cylinder(d2=0.4,d=0.5,h=0.054,$fn=5);
        cylinder(d2=0.3,d=0.2,h=0.016,$fn=5);

        }
        
              translate([-1.5,0.25,0.48])scale([1,1,1])difference(){
        cylinder(d2=0.4,d=0.5,h=0.054,$fn=5);
        cylinder(d2=0.3,d=0.2,h=0.016,$fn=5);

        }
             translate([-1.5,-0.25,0.48])scale([1,1,1])difference(){
        cylinder(d2=0.4,d=0.5,h=0.054,$fn=5);
        cylinder(d2=0.3,d=0.2,h=0.01,$fn=5);
        }
        
        

        
    }}
      if (style==6){ difference(){union(){
    cube([8,2,1],center=true);
for(i=[0:0.2:0.9])
    {
   translate([-3.9+i,0,0.45])rotate([0,45,0]) cube([0.1,0.99,0.1],center=true);
   translate([2.3,0.40-i,0.47]) rotate([0,-5,0]) resize([0.99,0.1,0.1])cylinder(1,center=true,$fn=10);
     
    }
 for(i=[0:0.25:0.9])
    {
   translate([0.8+i,0,0.47]) rotate([0,-7,0])resize([0.5,1.3,0.1])rotate([90,0,0])sphere(10,center=true,$fn=15);
   translate([-2.65,0.40-i,0.50-0.01]) resize([0.6,0.3,0.1])rotate([90,0,0])sphere(10,center=true,$fn=10);
     translate([-2.15,0.40-i,0.50-0.01]) resize([0.6,0.3,0.1])rotate([90,0,0])sphere(10,center=true,$fn=10);
    }
    
    
    translate([0,0,0.4999])scale([1,1,1])difference(){
         resize([1.2,1.2,0.054])sphere(10,center=true);
        translate([0,0,0.03])resize([0.65,0.65,0.054])sphere(10,center=true ,$fn=16);

        }
           
        
        

        
    }
    
     translate([3.4,0,0.4999] ) resize([1.2,1.3,0.2])rotate([90,0,0])sphere(10,center=true,$fn=18);
   
     translate([-1,0.25,0.51])scale([1,1,1])difference(){
        resize(  [0.51,0.5,0.054]) rotate([90,0,0])sphere(10,center=true,$fn=10);

        }
             translate([-1,-0.25,0.51])scale([1,1,1])difference(){
        resize(  [0.51,0.5,0.054]) rotate([90,0,0])sphere(10,center=true,$fn=10);

        }
        
              translate([-1.5,0.25,0.51])scale([1,1,1])difference(){
        resize(  [0.51,0.5,0.054]) rotate([90,0,0])sphere(10,center=true,$fn=10);

        }
             translate([-1.5,-0.25,0.51])scale([1,1,1])difference(){
        resize(  [0.51,0.5,0.054]) rotate([90,0,0])sphere(10,center=true,$fn=10);
        }
    }}
    //////
    }
